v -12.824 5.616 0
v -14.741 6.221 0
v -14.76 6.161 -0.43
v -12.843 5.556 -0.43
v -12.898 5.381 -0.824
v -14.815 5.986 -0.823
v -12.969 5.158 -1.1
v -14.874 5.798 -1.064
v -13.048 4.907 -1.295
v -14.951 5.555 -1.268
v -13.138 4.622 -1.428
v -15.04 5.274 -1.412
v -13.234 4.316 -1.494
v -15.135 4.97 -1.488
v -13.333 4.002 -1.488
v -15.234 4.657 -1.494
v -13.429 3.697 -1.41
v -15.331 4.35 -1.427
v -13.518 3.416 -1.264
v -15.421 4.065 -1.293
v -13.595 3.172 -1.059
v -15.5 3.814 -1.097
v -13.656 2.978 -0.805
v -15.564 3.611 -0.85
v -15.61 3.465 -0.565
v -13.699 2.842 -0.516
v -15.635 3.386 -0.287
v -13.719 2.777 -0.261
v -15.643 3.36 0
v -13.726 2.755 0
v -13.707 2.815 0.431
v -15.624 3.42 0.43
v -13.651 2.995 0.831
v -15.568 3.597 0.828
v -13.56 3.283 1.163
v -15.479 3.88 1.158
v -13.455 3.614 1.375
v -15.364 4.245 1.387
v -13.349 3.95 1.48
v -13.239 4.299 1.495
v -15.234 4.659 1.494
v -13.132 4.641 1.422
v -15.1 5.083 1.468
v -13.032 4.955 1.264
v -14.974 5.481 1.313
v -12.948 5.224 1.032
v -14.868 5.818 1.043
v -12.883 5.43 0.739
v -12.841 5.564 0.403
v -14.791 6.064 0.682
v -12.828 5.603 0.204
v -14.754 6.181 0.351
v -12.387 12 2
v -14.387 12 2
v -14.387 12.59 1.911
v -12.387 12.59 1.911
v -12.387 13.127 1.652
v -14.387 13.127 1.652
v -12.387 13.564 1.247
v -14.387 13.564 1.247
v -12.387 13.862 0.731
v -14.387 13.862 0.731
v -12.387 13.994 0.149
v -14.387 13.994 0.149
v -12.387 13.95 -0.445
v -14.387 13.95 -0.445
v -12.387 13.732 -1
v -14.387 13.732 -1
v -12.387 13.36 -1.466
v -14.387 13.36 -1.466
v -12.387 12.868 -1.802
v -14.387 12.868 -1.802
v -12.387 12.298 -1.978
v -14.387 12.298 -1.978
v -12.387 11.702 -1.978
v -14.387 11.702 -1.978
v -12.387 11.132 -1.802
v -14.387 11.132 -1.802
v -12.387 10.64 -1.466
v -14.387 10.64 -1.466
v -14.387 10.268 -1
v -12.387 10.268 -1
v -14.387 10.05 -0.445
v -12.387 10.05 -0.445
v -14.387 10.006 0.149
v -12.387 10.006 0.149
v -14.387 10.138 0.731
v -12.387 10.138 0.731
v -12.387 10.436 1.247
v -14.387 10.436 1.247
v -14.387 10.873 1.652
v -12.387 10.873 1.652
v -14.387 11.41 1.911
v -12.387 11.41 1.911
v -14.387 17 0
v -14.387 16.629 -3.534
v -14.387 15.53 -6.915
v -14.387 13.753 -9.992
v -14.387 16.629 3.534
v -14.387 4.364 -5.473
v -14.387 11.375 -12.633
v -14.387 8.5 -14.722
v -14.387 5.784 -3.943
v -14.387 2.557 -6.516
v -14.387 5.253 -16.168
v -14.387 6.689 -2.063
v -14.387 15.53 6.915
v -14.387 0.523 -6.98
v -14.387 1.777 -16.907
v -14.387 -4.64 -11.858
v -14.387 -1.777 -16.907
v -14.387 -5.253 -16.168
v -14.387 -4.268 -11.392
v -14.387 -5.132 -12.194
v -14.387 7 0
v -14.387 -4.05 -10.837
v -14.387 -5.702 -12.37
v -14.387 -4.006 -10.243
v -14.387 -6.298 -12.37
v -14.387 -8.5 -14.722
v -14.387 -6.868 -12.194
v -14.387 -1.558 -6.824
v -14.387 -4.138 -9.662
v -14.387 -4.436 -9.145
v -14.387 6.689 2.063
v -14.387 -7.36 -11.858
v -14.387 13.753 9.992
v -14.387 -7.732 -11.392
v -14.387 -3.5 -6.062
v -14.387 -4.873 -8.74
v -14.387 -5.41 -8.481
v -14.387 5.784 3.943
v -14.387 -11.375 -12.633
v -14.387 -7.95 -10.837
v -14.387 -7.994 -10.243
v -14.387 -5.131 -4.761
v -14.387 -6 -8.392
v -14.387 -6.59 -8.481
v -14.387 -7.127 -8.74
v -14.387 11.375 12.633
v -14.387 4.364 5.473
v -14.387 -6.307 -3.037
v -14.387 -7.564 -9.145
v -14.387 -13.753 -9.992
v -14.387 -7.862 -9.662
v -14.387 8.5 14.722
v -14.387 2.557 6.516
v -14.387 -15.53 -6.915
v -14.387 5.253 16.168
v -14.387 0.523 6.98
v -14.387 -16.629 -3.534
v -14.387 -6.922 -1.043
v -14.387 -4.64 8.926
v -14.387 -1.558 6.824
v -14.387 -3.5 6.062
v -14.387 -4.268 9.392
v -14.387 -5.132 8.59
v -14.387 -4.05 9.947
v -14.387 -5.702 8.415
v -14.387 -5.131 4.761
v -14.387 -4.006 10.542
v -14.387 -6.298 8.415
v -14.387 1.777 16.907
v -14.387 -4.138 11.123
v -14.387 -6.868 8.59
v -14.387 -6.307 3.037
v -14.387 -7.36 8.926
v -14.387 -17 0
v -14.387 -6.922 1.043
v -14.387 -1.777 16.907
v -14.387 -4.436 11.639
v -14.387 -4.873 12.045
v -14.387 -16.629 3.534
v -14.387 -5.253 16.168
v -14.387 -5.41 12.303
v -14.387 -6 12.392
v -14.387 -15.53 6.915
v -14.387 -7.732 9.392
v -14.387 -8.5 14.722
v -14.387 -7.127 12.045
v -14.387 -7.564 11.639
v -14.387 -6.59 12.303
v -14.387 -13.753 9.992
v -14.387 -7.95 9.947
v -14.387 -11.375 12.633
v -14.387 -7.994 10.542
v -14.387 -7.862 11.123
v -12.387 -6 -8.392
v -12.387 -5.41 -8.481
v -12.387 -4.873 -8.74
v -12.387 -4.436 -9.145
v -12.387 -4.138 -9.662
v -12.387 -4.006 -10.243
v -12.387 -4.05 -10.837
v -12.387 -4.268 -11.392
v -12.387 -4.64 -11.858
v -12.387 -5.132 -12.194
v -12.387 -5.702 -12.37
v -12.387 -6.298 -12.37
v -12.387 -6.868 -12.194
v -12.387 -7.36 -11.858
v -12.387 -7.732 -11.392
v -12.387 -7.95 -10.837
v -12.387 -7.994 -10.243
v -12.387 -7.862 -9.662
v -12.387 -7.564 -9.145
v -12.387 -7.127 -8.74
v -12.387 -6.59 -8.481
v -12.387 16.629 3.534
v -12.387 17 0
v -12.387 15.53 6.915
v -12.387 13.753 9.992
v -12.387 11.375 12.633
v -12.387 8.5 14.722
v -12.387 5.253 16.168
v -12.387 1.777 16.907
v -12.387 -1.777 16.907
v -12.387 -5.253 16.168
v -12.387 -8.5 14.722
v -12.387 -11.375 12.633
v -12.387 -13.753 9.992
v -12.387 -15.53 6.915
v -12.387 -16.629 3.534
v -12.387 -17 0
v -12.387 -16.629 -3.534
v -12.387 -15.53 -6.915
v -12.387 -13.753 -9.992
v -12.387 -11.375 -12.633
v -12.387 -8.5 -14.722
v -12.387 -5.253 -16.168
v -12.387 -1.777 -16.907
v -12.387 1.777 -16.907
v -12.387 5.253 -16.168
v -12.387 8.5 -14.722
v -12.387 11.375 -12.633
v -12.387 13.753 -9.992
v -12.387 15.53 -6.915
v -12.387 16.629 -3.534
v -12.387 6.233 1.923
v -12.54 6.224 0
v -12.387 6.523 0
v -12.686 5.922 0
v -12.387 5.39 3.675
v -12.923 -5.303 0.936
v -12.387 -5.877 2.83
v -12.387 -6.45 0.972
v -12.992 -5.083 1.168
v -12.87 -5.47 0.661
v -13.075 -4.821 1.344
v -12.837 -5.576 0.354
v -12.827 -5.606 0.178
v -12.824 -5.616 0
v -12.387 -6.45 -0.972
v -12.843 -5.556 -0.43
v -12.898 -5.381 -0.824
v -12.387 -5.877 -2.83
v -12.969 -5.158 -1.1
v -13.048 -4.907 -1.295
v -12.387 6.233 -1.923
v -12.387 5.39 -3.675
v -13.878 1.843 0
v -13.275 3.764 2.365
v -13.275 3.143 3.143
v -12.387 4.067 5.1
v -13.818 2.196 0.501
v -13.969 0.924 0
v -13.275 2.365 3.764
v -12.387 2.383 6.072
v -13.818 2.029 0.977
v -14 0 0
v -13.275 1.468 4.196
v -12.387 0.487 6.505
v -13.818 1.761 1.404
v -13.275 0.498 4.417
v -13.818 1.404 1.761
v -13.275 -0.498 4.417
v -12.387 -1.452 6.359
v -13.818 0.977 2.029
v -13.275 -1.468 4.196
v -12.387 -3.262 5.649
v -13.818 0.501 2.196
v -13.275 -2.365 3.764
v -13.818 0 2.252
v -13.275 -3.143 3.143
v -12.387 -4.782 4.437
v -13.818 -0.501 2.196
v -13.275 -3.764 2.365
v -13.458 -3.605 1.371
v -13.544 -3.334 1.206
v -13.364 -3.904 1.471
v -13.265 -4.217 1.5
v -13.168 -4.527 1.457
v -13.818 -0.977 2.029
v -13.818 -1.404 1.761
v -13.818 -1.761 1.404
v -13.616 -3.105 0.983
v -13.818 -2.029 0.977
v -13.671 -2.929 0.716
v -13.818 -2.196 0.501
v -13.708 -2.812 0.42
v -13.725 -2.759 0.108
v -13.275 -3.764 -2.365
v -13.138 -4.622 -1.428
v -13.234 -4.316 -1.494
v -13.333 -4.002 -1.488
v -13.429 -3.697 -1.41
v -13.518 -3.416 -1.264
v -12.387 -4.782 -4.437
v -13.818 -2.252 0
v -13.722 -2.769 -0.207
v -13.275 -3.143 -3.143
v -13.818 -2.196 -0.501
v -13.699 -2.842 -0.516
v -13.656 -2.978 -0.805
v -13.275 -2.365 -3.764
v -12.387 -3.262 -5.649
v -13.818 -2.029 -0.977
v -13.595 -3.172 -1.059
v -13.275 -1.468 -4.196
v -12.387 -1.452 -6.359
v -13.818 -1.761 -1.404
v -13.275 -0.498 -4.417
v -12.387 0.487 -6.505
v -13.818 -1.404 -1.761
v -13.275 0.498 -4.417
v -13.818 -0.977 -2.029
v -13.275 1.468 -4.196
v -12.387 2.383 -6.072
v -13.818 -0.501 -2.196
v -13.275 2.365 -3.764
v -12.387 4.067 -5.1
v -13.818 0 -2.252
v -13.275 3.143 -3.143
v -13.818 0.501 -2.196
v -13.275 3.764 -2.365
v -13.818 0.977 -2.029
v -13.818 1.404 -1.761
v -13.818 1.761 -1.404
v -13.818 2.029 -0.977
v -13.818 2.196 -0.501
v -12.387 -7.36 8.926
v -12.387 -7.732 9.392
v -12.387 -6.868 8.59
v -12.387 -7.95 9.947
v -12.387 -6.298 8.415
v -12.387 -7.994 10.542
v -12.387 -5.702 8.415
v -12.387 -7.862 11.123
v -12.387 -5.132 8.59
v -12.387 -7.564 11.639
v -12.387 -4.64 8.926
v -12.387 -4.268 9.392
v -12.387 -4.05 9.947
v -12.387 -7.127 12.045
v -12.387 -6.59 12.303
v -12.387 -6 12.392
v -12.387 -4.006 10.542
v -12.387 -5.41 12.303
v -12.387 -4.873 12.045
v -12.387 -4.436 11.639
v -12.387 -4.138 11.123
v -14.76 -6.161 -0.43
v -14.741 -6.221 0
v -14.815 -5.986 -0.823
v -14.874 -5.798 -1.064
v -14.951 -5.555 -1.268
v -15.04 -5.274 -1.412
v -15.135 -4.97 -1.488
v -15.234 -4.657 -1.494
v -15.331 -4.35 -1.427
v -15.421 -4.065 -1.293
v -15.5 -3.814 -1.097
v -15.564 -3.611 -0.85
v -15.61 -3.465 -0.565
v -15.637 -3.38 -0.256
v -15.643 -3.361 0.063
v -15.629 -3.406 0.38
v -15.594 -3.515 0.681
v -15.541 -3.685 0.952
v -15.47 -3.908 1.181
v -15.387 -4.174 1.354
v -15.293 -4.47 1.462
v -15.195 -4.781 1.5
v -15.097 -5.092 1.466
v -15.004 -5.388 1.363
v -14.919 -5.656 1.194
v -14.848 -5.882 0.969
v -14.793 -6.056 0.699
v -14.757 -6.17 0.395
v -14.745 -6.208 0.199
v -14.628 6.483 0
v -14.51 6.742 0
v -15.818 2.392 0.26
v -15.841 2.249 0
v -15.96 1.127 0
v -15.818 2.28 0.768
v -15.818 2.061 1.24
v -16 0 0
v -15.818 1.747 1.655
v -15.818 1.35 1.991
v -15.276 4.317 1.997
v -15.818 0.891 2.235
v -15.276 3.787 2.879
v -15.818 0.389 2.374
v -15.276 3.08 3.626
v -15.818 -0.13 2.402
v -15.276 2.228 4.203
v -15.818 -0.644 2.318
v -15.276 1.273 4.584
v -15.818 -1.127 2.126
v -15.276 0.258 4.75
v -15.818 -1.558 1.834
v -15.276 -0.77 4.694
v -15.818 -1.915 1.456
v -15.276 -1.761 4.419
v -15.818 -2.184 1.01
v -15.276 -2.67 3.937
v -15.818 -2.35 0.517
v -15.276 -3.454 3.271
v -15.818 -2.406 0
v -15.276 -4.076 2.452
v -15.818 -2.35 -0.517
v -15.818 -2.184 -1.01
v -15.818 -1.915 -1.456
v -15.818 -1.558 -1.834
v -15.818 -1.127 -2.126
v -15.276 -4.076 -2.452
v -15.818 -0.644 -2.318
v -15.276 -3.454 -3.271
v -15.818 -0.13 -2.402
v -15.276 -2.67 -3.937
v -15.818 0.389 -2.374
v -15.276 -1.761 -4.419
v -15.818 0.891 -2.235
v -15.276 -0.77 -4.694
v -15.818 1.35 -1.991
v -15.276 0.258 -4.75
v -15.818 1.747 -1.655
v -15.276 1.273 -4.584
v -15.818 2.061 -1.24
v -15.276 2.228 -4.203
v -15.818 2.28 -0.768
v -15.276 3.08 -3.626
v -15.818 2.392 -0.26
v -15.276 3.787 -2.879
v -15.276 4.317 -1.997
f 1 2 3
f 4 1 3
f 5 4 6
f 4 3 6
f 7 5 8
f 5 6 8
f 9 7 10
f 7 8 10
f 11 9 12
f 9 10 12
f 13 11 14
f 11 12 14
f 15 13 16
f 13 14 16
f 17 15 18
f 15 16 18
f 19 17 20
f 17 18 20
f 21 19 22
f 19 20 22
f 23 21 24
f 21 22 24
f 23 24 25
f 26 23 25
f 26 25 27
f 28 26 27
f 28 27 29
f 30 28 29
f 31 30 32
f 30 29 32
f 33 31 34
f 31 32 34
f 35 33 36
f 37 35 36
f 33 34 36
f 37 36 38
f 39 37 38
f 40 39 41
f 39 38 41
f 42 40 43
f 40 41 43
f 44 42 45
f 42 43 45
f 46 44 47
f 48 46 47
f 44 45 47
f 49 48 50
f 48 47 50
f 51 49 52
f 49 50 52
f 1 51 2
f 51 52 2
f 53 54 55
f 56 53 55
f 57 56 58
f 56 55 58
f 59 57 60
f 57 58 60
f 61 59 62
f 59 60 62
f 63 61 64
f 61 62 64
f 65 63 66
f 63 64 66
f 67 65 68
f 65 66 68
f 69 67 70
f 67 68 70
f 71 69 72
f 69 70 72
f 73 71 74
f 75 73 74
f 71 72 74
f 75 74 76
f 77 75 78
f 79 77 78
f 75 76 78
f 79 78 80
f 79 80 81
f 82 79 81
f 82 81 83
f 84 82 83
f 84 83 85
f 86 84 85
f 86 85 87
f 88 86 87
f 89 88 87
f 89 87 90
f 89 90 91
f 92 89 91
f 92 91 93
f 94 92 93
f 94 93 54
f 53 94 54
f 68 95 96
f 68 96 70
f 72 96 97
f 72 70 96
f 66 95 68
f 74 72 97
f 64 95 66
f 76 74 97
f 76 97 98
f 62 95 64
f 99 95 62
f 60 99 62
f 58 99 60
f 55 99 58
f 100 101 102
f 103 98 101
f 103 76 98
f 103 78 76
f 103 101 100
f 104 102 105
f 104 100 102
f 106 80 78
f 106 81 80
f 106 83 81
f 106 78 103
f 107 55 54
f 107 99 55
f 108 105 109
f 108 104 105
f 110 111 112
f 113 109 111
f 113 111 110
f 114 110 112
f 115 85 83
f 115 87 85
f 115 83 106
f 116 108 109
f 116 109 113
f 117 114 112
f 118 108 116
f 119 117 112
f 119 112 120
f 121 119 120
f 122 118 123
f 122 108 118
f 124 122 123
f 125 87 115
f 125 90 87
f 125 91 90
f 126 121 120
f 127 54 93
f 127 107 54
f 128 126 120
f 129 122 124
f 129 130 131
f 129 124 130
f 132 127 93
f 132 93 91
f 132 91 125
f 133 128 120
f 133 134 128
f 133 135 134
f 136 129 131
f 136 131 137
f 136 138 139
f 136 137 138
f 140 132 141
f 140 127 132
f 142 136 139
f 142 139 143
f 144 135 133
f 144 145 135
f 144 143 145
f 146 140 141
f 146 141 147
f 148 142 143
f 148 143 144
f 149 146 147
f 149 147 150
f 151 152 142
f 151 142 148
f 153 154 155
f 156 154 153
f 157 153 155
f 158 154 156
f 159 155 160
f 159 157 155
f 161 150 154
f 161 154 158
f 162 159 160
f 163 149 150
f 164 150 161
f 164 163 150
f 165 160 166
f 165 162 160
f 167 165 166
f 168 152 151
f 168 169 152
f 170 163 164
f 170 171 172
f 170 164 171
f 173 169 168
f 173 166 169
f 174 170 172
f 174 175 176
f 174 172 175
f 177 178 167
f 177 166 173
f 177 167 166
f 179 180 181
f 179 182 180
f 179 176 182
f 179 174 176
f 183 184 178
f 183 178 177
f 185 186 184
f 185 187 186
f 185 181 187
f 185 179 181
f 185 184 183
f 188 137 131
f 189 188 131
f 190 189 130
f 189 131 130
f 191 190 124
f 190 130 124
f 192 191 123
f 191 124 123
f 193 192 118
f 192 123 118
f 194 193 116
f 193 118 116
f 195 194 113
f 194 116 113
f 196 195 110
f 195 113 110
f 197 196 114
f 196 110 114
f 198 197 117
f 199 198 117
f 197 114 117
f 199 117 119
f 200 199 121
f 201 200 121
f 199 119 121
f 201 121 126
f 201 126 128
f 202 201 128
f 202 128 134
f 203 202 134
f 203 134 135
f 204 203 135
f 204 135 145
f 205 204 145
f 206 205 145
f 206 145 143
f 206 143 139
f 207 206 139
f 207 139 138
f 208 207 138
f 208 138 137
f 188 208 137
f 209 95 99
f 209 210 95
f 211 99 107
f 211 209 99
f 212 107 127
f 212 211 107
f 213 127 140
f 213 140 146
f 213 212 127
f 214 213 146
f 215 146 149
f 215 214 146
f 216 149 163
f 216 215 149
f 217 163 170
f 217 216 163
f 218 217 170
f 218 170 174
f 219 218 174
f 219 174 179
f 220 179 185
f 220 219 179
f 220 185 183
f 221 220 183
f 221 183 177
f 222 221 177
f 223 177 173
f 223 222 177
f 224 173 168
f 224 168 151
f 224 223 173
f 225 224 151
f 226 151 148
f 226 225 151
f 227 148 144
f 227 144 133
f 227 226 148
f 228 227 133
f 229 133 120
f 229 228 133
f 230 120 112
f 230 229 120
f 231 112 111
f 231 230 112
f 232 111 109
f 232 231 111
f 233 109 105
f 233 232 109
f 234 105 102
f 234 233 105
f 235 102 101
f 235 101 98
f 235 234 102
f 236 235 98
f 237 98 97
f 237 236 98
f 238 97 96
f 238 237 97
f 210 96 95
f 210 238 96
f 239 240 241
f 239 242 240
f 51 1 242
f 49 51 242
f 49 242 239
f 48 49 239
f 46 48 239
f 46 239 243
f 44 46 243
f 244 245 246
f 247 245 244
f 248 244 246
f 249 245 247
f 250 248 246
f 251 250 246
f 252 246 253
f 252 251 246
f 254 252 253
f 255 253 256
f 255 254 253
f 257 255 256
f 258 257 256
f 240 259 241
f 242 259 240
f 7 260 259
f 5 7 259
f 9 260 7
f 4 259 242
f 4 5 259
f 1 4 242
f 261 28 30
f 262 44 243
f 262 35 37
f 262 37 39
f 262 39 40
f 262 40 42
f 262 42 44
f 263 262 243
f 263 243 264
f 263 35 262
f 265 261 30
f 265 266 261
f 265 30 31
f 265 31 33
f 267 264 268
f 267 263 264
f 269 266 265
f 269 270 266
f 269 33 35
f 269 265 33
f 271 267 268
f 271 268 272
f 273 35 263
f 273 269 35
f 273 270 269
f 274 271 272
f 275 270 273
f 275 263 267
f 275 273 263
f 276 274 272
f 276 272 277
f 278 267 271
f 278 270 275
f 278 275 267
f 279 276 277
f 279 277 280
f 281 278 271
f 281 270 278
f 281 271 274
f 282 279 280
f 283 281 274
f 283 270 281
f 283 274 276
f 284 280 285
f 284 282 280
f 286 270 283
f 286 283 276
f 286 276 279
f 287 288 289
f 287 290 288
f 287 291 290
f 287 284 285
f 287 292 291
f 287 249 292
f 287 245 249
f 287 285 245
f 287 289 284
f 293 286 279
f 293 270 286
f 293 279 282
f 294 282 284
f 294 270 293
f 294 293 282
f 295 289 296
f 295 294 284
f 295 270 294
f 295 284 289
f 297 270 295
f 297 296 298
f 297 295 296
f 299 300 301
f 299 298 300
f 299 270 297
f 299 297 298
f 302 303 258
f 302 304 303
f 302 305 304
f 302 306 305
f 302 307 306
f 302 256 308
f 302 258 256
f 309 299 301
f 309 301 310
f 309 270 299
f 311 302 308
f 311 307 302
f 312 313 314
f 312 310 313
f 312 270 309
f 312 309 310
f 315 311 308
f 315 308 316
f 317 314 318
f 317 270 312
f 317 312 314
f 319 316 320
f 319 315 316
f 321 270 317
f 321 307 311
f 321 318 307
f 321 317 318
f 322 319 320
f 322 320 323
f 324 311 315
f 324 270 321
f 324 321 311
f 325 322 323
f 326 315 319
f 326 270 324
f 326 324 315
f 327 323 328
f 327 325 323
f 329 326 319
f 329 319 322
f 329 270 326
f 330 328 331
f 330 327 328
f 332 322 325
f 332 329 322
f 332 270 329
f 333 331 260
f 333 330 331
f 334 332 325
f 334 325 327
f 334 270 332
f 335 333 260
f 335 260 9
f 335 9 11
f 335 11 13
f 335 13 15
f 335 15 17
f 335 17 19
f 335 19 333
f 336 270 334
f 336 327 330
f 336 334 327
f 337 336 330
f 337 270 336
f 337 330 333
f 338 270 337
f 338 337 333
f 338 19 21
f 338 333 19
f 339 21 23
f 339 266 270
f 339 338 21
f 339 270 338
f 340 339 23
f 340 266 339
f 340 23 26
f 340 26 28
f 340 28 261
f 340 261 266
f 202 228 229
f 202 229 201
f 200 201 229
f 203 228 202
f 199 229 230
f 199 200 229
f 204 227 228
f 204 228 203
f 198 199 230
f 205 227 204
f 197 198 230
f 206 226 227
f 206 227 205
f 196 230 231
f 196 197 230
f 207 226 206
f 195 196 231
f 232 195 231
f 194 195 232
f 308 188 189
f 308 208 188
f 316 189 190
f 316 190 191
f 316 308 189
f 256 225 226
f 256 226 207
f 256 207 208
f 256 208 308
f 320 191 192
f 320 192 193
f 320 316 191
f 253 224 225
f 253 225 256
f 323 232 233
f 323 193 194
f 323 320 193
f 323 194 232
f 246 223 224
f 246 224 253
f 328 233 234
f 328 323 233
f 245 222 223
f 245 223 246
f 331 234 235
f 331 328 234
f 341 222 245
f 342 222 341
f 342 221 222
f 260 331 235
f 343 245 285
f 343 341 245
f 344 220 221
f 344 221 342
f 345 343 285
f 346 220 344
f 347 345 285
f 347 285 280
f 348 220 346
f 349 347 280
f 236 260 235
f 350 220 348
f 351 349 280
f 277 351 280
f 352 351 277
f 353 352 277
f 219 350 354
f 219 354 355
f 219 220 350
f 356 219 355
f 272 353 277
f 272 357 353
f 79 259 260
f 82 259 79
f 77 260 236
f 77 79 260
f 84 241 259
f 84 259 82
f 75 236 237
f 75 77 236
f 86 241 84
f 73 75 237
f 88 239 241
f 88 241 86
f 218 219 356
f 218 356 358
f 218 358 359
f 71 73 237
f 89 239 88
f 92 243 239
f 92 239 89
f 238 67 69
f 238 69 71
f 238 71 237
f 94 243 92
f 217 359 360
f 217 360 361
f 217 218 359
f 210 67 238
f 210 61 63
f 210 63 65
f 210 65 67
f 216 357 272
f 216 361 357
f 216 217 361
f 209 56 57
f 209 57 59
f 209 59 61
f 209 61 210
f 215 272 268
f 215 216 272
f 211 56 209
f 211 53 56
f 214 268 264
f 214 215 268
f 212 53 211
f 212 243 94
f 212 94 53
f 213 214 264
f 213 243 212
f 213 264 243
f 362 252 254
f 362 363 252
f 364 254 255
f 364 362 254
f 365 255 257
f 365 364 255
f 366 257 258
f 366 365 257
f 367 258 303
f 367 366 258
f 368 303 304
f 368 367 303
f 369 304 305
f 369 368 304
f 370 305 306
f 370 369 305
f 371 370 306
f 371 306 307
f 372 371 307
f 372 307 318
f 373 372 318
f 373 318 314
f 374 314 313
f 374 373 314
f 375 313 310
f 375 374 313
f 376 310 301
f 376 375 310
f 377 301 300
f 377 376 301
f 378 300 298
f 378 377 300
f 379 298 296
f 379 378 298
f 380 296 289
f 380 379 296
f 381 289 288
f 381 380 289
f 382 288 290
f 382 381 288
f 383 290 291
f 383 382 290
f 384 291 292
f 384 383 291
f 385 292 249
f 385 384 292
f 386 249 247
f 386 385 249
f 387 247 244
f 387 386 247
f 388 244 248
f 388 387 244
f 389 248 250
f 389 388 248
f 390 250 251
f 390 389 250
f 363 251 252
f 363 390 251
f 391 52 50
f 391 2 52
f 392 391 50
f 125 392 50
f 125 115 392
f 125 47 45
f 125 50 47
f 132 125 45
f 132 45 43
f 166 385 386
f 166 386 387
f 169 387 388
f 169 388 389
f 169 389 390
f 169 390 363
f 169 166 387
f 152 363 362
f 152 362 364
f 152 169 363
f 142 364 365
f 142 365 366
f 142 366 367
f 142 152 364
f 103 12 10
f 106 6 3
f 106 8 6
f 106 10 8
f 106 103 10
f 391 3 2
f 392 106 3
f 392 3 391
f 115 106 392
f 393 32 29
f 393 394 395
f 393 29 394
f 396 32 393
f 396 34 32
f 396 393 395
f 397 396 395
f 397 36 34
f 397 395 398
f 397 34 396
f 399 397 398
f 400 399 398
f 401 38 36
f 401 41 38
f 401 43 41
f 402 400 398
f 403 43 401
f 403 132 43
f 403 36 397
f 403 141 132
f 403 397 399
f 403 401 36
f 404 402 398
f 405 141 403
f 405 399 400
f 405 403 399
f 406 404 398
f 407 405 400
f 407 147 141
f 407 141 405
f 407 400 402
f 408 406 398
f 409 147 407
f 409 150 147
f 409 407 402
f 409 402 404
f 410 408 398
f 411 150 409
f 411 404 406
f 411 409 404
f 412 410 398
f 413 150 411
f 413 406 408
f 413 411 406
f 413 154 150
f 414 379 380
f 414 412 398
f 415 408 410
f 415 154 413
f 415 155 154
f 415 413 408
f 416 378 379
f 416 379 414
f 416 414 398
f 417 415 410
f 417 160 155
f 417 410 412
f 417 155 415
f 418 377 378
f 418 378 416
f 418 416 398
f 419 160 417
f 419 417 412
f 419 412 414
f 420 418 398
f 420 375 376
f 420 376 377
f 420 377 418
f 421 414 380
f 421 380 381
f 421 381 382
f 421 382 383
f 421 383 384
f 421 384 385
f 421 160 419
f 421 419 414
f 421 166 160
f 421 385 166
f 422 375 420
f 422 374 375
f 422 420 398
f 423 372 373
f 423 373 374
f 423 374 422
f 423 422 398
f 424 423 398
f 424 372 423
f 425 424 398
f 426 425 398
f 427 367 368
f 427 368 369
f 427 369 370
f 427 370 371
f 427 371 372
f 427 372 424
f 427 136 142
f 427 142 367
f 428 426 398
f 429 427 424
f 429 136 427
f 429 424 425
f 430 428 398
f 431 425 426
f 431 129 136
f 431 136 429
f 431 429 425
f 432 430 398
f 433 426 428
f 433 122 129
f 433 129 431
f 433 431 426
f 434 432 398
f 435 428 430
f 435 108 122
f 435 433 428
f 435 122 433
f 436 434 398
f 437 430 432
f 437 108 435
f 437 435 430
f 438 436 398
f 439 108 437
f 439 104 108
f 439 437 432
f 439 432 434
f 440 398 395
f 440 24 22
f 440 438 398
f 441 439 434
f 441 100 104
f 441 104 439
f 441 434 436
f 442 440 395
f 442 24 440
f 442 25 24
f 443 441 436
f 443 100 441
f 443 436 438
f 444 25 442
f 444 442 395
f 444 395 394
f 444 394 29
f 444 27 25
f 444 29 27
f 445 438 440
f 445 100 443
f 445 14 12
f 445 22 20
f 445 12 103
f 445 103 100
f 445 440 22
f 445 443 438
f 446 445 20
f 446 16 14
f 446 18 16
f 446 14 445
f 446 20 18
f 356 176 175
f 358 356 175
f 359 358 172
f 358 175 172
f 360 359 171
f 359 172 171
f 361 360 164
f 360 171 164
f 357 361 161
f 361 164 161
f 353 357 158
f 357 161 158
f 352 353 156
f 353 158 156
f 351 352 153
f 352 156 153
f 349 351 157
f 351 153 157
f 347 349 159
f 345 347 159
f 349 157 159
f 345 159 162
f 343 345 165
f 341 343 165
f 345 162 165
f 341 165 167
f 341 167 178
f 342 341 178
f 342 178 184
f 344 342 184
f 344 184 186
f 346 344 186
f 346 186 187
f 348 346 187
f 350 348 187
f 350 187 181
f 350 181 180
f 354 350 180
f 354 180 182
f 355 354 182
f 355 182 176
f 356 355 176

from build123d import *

# Parameters (mm, degrees)
SKETCH_3_R          = 2
CUT_EXTRUDE_1_DEPTH = 10


with BuildPart() as part:
    # 草图1 → 旋转3 (revolve)
    with BuildSketch(Plane.XY):
        with BuildLine():
            Line((-14.38749457, 17), (-12.38749457, 17))
            Line((-12.38749457, 17), (-12.38749457, 6.523034438))
            ThreePointArc((-12.38749457, 6.523034438), (-13.590896291, 3.359693142), (-14, 0))
            Line((-14, 0), (-16, 0))
            ThreePointArc((-16, 0), (-15.591663047, 3.591663047), (-14.38749457, 7))
            Line((-14.38749457, 7), (-14.38749457, 17))
        make_face()
    revolve(axis=Axis((-26.155193714, 0, 0), (1, 0, 0)))

    # 草图2 → 切除-旋转1 (revolve, cut)
    with BuildSketch(Plane.XY):
        Polygon((-10.99354471, 5.03904502), (-18.623280316, 7.444691416), (-19.074339015, 6.01411599), (-11.444603409, 3.608469594), align=None)
    cut_revolve_1 = revolve(axis=Axis((0, 0, 0), (-0.9537169507482267, 0.30070579950427373, 0)), mode=Mode.SUBTRACT)

    # 镜向1: 切除-旋转1 across plane
    add(cut_revolve_1.mirror(Plane.ZX), mode=Mode.SUBTRACT)

    # 草图3 → 切除-拉伸1 (cut)
    with BuildSketch(Plane.ZY.offset(14.38749457)):
        with Locations((0, 12)):
            Circle(SKETCH_3_R)
        with Locations((10.392304845, -6)):
            Circle(SKETCH_3_R)
        with Locations((-10.392304845, -6)):
            Circle(SKETCH_3_R)
    extrude(amount=-CUT_EXTRUDE_1_DEPTH, mode=Mode.SUBTRACT)


solid = part.part
